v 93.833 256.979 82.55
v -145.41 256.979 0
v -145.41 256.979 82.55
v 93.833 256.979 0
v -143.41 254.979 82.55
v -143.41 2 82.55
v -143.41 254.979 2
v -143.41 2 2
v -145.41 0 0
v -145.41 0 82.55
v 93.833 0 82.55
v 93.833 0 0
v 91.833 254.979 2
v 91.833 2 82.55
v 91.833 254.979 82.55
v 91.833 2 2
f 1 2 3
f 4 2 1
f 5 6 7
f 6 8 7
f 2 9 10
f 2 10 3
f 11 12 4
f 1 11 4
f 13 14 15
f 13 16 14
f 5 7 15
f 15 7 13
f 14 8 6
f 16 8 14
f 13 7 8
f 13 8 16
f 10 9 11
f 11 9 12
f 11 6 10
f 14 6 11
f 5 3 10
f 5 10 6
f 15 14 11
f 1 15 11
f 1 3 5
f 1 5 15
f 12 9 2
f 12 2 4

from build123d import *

# Parameters (mm, degrees)
F0_W     = 239.2428293824
F0_H     = 256.9792084396
F2_DEPTH = 82.55
F3_T     = -2
F4_DEPTH = 2


with BuildPart() as f2:
    # F0 (on Top) → F2 (new body)
    with BuildSketch(Plane.XY):
        with Locations((-25.7889069617, 128.4896042198)):
            Rectangle(F0_W, F0_H)
    extrude(amount=F2_DEPTH)

    # F3
    f3_openings = [f2.faces().sort_by_distance(p)[0] for p in [
        (-25.788907, 128.489604, 82.55),
    ]]
    offset(amount=F3_T, openings=f3_openings)

    # F0 (on Top) → F4 (join)
    with BuildSketch(Plane.XY):
        with Locations((-25.7889069617, 128.4896042198)):
            Rectangle(F0_W, F0_H)
    extrude(amount=F4_DEPTH)


solid = f2.part
